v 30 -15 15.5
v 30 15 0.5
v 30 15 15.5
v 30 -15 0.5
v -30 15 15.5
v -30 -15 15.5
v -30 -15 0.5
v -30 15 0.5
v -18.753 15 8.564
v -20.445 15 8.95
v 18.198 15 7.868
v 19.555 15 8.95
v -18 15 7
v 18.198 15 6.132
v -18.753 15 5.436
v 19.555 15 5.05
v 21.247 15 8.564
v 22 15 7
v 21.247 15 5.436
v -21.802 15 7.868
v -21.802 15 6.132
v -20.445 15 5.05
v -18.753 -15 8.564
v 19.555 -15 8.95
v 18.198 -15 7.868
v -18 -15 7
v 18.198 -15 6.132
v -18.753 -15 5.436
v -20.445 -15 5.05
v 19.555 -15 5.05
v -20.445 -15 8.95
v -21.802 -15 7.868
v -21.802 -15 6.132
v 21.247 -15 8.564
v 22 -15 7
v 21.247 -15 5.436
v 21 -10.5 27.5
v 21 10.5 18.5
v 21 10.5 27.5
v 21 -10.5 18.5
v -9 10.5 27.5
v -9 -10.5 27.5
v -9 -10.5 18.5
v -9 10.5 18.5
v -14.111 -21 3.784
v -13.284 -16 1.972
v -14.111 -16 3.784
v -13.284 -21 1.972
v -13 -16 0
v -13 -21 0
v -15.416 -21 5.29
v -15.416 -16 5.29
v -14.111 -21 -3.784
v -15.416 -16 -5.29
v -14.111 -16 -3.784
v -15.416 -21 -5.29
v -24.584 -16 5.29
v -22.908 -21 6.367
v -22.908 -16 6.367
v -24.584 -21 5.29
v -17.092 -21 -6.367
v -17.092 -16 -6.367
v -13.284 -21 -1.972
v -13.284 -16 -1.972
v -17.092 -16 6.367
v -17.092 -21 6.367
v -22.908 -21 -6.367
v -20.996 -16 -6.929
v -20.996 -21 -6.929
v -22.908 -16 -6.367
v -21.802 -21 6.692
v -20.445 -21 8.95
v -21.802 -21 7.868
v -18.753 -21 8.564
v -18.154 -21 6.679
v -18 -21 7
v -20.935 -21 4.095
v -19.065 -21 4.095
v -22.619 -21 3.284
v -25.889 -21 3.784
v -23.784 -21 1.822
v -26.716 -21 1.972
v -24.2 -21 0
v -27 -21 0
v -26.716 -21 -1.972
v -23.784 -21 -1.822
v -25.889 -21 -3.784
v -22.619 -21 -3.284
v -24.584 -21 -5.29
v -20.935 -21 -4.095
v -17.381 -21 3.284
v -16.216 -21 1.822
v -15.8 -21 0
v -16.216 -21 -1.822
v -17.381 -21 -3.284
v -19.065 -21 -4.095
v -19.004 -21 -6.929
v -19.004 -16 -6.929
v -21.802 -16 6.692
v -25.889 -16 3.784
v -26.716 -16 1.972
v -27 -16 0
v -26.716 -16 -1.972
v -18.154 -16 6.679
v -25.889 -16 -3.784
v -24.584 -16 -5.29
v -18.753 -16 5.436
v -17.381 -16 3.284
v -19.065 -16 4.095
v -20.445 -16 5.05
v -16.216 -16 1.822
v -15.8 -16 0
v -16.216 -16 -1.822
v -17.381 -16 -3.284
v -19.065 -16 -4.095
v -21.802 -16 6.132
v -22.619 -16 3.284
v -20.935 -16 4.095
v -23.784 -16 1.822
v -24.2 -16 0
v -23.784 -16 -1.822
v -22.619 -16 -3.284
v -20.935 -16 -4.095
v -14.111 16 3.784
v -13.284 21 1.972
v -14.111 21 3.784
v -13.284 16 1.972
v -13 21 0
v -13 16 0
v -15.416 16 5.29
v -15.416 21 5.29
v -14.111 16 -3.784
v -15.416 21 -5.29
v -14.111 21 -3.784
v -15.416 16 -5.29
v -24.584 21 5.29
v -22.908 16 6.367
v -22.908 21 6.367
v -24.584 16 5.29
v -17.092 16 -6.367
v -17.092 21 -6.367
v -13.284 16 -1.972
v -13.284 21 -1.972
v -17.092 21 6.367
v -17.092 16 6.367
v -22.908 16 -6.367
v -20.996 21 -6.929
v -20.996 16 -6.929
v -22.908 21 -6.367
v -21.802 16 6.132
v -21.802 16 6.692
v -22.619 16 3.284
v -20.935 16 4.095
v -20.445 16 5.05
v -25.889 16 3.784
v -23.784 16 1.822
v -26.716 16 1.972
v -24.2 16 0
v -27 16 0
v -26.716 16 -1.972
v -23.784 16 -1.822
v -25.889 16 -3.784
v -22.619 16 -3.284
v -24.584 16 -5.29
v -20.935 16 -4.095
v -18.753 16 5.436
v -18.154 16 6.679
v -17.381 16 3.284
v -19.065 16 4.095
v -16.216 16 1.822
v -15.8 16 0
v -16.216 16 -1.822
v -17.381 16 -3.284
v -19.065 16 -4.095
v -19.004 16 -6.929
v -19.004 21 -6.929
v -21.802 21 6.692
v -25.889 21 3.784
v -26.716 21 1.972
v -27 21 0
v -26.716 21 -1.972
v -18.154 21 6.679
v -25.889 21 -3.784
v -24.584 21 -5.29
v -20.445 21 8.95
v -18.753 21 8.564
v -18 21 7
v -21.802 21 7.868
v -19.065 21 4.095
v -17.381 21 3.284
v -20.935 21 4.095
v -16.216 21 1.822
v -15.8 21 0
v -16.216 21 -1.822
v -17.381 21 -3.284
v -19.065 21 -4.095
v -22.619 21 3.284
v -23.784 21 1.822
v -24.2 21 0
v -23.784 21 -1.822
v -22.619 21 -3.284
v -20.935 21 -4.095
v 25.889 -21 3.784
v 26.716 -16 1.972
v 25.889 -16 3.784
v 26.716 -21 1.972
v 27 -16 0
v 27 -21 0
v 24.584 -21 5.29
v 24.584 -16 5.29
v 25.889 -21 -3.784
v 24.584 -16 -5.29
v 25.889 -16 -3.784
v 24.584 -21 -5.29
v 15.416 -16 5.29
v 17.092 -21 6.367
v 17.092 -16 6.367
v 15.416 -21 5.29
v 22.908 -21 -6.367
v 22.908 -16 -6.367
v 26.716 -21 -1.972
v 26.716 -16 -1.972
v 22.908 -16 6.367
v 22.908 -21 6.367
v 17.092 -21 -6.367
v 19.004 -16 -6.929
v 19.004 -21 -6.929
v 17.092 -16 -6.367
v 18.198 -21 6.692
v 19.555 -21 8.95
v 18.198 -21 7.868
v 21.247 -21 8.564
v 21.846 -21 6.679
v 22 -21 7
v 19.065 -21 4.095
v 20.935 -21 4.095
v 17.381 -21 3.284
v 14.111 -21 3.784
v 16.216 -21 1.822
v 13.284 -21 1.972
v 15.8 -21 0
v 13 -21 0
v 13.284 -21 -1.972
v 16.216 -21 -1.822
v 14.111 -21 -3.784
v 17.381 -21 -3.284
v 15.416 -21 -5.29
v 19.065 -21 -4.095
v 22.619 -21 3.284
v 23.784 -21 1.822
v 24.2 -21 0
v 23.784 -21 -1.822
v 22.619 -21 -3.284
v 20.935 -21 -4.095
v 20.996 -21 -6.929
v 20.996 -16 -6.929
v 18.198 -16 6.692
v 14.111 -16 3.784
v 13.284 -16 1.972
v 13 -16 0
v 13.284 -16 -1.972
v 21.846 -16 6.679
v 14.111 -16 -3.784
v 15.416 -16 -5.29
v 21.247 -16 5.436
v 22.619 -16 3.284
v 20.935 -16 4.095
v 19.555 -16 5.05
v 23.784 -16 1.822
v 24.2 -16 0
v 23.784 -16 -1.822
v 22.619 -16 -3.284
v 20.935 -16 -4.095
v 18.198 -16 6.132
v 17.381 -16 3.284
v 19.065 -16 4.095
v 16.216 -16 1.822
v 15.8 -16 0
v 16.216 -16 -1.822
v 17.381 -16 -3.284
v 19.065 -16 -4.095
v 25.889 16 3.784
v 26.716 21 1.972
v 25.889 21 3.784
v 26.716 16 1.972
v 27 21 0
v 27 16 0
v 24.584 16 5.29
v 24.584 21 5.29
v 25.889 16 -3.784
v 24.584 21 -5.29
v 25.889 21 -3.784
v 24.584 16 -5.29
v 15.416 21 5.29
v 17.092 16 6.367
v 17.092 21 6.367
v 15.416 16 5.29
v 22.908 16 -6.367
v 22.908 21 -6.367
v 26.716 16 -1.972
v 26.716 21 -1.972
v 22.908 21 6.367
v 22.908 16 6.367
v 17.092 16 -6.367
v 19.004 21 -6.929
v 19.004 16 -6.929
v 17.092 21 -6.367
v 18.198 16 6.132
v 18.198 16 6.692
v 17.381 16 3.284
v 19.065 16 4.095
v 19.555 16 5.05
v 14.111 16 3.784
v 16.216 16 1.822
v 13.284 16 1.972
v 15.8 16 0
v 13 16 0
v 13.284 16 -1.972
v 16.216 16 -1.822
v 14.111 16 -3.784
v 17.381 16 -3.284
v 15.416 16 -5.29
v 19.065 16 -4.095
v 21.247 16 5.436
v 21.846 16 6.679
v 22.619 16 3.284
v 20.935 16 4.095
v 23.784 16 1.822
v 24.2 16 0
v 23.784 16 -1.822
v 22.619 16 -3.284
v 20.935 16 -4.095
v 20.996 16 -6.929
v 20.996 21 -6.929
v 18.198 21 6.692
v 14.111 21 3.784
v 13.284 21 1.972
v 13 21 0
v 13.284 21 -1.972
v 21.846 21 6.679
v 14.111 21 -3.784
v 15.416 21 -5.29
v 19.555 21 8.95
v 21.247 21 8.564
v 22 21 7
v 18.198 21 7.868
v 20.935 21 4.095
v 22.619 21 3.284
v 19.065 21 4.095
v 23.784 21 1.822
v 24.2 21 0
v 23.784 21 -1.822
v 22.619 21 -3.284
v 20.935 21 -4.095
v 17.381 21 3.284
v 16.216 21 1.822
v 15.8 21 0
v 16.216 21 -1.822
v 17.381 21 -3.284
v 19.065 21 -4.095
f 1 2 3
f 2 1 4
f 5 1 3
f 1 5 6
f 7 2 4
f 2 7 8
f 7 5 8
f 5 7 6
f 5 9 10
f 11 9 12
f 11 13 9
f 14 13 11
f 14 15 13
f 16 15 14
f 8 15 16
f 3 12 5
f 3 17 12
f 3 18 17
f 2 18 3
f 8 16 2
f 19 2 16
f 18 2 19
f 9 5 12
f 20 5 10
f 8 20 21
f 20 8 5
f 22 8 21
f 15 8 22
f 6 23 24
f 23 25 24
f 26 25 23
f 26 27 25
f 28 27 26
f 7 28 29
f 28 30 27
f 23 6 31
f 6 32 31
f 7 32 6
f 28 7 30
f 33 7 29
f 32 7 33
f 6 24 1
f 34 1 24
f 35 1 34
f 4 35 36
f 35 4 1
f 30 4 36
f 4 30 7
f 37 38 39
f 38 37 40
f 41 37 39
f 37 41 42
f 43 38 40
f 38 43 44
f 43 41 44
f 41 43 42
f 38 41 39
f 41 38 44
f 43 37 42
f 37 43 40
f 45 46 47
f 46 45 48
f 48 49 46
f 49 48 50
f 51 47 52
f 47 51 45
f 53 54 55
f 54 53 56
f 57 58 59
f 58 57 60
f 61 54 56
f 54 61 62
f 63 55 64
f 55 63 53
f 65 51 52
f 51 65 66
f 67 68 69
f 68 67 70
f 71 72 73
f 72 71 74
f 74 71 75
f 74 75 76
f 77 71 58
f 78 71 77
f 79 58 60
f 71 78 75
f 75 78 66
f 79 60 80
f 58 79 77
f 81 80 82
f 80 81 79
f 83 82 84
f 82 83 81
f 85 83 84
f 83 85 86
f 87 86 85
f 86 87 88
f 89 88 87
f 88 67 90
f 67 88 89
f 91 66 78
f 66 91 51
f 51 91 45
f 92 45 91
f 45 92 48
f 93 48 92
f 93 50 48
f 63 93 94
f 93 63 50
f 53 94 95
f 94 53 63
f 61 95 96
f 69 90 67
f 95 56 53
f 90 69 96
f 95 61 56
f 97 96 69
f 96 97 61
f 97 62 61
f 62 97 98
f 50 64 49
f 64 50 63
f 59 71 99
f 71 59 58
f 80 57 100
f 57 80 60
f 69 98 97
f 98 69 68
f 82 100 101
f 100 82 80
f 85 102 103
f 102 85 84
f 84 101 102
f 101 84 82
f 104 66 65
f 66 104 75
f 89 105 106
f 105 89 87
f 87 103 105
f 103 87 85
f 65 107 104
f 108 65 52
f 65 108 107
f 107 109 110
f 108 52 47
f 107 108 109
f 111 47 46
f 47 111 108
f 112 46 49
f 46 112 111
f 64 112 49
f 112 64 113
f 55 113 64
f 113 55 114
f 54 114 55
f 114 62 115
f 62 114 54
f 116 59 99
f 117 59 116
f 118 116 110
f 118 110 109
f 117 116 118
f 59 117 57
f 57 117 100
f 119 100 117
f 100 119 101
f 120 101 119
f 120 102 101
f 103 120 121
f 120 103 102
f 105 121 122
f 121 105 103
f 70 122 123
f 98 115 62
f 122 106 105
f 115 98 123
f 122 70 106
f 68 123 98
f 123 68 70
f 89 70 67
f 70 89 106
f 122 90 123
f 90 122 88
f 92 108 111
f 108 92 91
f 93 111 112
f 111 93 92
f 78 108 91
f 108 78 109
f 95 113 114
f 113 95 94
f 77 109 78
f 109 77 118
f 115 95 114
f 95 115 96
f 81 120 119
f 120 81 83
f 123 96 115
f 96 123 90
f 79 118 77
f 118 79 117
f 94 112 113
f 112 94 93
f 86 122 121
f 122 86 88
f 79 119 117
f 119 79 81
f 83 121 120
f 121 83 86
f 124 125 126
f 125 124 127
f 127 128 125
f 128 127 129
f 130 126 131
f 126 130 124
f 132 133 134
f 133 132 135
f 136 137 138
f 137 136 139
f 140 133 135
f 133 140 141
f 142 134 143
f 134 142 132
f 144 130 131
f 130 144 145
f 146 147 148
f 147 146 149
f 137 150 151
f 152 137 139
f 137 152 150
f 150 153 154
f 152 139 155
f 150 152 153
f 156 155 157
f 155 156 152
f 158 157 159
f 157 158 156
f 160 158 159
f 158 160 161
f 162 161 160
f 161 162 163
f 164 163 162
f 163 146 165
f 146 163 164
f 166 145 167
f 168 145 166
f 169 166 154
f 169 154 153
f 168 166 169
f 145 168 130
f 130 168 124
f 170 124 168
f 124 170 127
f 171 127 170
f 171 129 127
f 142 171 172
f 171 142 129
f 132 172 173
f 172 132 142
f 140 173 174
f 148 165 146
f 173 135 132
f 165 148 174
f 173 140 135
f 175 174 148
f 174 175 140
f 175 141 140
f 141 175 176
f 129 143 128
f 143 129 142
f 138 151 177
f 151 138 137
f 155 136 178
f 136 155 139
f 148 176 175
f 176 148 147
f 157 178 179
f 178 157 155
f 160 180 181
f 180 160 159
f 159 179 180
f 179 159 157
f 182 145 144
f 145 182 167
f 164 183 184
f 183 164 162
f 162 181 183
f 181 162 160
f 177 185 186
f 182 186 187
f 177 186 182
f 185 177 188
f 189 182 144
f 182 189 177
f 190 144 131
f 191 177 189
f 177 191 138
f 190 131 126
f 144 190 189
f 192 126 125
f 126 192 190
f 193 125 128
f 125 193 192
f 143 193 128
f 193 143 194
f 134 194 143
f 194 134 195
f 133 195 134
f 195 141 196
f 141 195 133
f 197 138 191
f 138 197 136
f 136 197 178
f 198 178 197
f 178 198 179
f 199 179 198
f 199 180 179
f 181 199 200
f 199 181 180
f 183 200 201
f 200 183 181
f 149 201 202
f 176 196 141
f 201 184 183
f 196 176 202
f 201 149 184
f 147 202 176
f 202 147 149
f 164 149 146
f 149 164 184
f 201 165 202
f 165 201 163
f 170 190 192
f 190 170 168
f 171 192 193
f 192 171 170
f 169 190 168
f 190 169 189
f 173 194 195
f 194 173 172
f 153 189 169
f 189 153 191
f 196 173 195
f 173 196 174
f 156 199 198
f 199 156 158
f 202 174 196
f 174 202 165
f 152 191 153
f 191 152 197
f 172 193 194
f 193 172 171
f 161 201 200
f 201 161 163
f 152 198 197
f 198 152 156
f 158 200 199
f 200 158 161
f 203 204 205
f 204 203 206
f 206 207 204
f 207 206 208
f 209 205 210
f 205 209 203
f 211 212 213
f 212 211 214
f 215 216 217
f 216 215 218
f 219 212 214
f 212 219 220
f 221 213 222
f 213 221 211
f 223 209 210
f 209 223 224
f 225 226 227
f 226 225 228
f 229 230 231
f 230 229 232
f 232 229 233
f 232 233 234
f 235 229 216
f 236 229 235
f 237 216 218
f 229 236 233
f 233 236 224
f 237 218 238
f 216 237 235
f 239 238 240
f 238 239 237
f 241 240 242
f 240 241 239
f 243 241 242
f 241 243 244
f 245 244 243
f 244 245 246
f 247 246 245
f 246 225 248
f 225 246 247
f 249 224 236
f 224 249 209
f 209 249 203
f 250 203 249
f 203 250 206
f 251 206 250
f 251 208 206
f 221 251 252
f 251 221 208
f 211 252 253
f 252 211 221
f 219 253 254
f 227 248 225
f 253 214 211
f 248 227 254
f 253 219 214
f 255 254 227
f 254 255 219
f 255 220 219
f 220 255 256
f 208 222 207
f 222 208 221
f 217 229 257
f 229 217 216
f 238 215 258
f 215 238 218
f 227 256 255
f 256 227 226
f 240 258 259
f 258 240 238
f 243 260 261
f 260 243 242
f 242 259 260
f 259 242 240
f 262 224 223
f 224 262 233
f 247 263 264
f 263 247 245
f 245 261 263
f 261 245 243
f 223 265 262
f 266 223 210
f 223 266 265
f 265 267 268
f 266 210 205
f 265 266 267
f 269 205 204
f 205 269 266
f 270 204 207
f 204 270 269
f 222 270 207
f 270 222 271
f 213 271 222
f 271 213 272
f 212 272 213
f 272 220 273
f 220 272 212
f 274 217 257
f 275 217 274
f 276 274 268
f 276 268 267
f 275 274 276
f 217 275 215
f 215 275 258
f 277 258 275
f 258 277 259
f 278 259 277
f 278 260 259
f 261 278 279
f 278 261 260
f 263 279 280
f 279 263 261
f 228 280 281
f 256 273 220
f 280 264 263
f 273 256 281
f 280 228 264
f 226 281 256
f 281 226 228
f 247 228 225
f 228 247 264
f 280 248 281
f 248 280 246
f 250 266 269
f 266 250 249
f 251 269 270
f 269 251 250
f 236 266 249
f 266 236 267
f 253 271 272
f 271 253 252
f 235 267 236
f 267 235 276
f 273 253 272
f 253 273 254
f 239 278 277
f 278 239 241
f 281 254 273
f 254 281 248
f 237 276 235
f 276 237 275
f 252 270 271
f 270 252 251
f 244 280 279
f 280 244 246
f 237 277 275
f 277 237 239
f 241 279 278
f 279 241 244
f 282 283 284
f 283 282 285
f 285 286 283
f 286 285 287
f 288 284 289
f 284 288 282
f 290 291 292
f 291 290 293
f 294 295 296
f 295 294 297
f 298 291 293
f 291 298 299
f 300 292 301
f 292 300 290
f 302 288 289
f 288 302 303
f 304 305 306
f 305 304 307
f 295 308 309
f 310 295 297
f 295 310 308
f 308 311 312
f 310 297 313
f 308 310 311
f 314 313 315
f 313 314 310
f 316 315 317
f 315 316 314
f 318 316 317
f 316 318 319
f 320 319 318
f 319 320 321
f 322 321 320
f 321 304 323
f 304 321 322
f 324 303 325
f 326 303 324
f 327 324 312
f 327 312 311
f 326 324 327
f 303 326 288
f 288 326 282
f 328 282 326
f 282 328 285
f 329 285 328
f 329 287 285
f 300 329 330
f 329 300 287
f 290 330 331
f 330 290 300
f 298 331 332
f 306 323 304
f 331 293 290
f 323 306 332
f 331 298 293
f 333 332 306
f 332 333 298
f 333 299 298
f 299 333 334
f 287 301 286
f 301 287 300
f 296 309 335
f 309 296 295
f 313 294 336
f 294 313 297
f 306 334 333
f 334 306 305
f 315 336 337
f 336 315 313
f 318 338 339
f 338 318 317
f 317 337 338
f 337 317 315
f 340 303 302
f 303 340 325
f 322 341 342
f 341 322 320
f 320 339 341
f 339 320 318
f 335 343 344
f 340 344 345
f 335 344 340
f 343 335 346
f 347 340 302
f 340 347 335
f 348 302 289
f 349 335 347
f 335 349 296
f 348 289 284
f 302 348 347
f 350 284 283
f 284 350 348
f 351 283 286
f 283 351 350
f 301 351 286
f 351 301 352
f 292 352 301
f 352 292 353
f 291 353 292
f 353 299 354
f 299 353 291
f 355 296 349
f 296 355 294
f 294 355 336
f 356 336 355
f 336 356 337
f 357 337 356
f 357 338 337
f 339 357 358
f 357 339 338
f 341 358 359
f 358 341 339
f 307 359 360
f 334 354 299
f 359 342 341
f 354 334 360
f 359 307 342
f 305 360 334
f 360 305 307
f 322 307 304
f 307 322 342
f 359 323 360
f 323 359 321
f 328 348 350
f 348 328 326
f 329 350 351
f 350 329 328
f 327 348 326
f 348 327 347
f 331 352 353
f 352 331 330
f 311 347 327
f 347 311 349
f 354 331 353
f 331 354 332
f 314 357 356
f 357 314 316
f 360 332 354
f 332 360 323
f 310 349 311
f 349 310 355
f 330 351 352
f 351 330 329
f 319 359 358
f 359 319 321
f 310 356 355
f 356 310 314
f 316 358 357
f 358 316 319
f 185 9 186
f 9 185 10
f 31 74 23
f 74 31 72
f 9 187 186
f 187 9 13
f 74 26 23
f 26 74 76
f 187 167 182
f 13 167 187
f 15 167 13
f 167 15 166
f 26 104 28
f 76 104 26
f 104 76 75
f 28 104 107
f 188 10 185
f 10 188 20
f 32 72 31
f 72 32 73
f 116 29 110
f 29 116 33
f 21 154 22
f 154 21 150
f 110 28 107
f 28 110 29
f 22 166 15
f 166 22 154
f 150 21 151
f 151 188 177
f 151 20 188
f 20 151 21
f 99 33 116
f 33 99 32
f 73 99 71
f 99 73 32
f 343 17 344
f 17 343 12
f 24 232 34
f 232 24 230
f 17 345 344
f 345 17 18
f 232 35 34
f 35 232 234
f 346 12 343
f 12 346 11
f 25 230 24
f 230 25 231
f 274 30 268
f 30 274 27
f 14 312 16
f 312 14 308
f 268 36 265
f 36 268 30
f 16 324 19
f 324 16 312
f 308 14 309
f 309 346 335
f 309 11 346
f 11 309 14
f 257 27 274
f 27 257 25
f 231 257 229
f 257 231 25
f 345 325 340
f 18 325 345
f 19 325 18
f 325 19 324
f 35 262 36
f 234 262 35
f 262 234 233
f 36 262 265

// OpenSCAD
// Simple parametric car model

// Car body parameters
body_length = 60;
body_width = 30;
body_height = 15;

// Wheel parameters
wheel_radius = 7;
wheel_width = 5;
axle_radius = 2;
axle_length = body_width + 2 * (wheel_width + 1);

// Wheel positions
wheel_offset_x = body_length / 2 - wheel_radius - 3;
wheel_offset_y = body_width / 2 + wheel_width / 2 + 1;

// Main car module
module simple_car() {
    // Body
    difference() {
        union() {
            // Main body
            translate([0,0,wheel_radius + 1])
                cube([body_length, body_width, body_height], center=true);
            // Cabin (simple block for windshield)
            translate([6,0,wheel_radius + body_height + 1])
                cube([body_length/2, body_width*0.7, body_height*0.6], center=true);

        }
    }

    // Wheels and axles
    for(side=[-1,1]) {  // Front/Rear wheels
        // Axles
        translate([side * wheel_offset_x,0,wheel_radius])
            rotate([90,0,0])
                cylinder(h=axle_length, r=axle_radius, center=true);
        // Left and Right wheels at each axle
        for(lr=[-1,1])
            translate([side * wheel_offset_x, lr * wheel_offset_y, 0])
                rotate([90,0,0])
                    wheel();
    }
}

// Wheel module (with simple hubcap)
module wheel() {
    difference() {
        color("black")
            cylinder(h=wheel_width, r=wheel_radius, center=true);
        color("silver")
            translate([0,0,0])
                cylinder(h=wheel_width+0.2, r=wheel_radius*0.6, center=true);
    }
}

// Render the car
simple_car();
